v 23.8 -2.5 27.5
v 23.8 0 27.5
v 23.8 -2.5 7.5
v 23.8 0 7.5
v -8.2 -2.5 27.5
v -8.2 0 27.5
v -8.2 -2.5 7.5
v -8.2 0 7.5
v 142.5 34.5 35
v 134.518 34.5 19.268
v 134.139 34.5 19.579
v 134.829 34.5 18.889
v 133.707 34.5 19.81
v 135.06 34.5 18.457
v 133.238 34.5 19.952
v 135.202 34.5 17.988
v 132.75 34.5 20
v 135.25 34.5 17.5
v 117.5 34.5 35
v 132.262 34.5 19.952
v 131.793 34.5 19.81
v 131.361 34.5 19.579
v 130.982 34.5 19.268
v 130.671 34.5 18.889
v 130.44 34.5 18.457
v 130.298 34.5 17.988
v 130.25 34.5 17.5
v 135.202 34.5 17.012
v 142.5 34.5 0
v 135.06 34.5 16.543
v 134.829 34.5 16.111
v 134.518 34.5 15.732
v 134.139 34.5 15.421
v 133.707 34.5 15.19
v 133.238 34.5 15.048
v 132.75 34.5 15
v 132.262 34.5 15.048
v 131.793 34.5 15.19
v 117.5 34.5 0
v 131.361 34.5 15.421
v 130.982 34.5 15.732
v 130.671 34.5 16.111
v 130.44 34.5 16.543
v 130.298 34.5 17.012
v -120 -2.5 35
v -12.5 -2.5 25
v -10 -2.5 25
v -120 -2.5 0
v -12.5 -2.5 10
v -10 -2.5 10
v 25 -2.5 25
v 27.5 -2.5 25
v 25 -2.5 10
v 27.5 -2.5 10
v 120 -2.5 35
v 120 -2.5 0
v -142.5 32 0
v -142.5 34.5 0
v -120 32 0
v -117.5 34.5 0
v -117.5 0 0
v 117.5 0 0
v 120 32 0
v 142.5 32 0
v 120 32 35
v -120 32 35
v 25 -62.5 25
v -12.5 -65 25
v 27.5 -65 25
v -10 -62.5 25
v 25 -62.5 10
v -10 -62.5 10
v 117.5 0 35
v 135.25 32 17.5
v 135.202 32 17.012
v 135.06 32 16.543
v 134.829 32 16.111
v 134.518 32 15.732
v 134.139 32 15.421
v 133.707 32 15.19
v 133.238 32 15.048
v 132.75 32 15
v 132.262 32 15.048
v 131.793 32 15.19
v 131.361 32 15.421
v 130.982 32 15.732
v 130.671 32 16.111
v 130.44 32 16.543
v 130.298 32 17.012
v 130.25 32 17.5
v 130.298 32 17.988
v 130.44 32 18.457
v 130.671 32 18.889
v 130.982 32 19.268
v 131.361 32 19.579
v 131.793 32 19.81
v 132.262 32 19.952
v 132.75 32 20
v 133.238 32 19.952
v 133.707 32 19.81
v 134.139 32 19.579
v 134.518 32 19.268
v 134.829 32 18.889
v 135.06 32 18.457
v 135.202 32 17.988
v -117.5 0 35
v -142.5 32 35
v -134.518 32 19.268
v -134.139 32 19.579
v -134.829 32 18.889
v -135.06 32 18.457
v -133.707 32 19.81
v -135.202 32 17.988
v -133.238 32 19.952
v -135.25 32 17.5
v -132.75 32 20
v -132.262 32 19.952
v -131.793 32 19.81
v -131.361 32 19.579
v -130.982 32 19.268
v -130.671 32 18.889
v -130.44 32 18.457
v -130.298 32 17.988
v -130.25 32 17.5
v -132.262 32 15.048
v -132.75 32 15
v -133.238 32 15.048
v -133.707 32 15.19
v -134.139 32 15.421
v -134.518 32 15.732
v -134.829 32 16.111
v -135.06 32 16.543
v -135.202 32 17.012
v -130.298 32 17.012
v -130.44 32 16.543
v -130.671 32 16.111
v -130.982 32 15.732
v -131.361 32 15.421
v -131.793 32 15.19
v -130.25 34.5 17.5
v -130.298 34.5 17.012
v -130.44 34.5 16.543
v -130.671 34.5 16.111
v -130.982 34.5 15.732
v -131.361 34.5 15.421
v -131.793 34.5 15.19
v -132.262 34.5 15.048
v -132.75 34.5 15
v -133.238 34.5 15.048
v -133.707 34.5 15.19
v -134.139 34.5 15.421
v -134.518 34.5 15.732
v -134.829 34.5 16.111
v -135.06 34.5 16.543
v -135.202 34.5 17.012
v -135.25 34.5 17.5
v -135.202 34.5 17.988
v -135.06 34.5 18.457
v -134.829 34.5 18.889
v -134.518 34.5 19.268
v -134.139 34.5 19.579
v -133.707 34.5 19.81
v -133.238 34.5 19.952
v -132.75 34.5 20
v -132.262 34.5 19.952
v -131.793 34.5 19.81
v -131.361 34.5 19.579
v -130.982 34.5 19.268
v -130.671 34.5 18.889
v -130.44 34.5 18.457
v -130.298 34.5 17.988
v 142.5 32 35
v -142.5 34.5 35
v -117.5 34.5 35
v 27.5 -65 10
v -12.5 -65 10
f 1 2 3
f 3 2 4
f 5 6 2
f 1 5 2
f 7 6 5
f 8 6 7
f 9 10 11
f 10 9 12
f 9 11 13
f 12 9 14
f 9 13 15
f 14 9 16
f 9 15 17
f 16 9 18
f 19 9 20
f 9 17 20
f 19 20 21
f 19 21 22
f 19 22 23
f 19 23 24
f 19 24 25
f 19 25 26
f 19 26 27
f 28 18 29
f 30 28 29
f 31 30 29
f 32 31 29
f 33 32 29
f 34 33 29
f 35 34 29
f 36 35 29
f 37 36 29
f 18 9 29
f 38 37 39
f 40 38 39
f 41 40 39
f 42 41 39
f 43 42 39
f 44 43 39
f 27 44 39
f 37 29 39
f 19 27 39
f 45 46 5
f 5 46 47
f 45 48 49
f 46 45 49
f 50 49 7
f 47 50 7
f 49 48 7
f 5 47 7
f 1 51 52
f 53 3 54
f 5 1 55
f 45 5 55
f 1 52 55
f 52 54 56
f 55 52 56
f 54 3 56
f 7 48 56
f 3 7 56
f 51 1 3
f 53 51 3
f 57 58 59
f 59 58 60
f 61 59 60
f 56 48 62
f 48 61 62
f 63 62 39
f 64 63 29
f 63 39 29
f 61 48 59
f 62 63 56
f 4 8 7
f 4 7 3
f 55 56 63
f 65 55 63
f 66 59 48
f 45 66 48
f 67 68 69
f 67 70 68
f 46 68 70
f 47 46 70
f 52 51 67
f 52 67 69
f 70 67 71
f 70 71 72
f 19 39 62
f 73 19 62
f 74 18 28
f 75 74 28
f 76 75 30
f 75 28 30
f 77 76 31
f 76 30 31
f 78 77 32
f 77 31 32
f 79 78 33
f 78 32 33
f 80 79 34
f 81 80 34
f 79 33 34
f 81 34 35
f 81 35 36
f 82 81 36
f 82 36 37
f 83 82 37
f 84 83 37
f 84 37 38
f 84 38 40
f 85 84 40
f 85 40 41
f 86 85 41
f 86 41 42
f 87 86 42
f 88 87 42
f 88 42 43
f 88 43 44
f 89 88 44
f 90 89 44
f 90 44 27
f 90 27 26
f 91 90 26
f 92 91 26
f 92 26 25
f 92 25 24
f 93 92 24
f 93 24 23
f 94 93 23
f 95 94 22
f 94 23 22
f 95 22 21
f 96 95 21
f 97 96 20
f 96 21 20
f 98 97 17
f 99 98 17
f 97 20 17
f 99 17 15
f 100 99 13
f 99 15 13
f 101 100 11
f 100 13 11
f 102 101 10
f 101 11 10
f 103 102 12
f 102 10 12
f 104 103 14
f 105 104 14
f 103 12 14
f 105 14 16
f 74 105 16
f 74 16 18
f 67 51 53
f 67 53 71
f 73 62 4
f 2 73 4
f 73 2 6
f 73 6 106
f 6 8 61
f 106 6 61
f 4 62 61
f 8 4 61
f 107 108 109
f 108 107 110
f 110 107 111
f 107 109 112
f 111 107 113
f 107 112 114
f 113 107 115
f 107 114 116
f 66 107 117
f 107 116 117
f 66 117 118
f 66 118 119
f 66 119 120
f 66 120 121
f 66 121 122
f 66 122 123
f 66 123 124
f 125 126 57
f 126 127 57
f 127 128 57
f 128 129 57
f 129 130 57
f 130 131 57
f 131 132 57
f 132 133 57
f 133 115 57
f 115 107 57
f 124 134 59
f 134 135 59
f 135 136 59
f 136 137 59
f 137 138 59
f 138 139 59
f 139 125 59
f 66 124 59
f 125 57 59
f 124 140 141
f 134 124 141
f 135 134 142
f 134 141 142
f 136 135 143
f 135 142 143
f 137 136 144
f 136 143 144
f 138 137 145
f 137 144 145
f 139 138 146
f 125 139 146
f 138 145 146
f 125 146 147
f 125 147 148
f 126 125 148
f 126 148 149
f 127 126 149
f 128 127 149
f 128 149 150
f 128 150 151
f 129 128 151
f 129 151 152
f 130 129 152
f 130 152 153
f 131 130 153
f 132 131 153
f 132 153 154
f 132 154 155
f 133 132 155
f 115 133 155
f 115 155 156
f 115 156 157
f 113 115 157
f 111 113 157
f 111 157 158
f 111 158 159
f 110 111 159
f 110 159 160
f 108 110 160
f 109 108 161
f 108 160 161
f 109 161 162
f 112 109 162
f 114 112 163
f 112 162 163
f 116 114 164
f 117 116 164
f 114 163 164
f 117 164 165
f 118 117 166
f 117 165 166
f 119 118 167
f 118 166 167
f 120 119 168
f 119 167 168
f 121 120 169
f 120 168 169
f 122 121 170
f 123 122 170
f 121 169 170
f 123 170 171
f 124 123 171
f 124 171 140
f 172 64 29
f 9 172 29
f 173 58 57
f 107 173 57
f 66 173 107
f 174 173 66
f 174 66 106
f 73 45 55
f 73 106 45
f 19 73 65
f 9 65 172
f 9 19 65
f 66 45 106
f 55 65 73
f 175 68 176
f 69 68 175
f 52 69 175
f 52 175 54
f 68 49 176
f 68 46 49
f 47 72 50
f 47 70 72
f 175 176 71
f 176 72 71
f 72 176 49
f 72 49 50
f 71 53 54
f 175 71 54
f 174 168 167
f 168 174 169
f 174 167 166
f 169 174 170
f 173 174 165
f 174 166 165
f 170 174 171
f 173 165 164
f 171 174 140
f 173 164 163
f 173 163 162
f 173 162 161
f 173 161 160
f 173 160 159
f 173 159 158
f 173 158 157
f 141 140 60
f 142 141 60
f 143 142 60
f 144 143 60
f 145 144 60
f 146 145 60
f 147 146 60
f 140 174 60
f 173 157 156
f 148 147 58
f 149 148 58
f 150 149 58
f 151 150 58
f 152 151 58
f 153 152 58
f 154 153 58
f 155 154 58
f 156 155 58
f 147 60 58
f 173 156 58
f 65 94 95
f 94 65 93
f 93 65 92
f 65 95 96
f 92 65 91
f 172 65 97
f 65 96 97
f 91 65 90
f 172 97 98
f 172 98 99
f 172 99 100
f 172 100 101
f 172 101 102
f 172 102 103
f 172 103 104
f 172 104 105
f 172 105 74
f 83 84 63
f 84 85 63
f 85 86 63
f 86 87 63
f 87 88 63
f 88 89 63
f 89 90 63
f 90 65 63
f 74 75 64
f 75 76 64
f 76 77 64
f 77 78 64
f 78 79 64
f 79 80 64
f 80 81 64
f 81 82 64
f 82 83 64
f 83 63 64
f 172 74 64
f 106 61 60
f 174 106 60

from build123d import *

# Parameters (mm, degrees)
BOSS_EXTRUDE1_DEPTH = 35
SKETCH2_R           = 2.5
SKETCH2_W           = 32
SKETCH2_H           = 20
CUT_EXTRUDE1_DEPTH  = 90
BOSS_EXTRUDE2_DEPTH = 7.5


with BuildPart() as part:
    # Sketch1 → Boss-Extrude1 (new body)
    with BuildSketch(Plane.XY):
        Polygon((117.5, 0), (-117.5, 0), (-117.5, 34.5), (-142.5, 34.5), (-142.5, 32), (-120, 32), (-120, -2.5), (120, -2.5), (120, 32), (142.5, 32), (142.5, 34.5), (117.5, 34.5), align=None)
    extrude(amount=BOSS_EXTRUDE1_DEPTH)

    # Sketch2 → Cut-Extrude1 (cut)
    with BuildSketch(Plane(origin=(0, 34.5, 0), x_dir=(1, 0, 0), z_dir=(0, 1, 0))):
        with Locations((-132.75, -17.5)):
            Circle(SKETCH2_R)
        with Locations((132.75, -17.5)):
            Circle(SKETCH2_R)
        with Locations((7.8, -17.5)):
            Rectangle(SKETCH2_W, SKETCH2_H)
    extrude(amount=-CUT_EXTRUDE1_DEPTH, mode=Mode.SUBTRACT)

    # Sketch4 → Boss-Extrude2 (add, symmetric)
    with BuildSketch(Plane.XY.offset(17.5)):
        Polygon((-12.5, -2.5), (-12.5, -65), (27.5, -65), (27.5, -2.5), (25, -2.5), (25, -62.5), (-10, -62.5), (-10, -2.5), align=None)
    extrude(amount=BOSS_EXTRUDE2_DEPTH, both=True)


solid = part.part
